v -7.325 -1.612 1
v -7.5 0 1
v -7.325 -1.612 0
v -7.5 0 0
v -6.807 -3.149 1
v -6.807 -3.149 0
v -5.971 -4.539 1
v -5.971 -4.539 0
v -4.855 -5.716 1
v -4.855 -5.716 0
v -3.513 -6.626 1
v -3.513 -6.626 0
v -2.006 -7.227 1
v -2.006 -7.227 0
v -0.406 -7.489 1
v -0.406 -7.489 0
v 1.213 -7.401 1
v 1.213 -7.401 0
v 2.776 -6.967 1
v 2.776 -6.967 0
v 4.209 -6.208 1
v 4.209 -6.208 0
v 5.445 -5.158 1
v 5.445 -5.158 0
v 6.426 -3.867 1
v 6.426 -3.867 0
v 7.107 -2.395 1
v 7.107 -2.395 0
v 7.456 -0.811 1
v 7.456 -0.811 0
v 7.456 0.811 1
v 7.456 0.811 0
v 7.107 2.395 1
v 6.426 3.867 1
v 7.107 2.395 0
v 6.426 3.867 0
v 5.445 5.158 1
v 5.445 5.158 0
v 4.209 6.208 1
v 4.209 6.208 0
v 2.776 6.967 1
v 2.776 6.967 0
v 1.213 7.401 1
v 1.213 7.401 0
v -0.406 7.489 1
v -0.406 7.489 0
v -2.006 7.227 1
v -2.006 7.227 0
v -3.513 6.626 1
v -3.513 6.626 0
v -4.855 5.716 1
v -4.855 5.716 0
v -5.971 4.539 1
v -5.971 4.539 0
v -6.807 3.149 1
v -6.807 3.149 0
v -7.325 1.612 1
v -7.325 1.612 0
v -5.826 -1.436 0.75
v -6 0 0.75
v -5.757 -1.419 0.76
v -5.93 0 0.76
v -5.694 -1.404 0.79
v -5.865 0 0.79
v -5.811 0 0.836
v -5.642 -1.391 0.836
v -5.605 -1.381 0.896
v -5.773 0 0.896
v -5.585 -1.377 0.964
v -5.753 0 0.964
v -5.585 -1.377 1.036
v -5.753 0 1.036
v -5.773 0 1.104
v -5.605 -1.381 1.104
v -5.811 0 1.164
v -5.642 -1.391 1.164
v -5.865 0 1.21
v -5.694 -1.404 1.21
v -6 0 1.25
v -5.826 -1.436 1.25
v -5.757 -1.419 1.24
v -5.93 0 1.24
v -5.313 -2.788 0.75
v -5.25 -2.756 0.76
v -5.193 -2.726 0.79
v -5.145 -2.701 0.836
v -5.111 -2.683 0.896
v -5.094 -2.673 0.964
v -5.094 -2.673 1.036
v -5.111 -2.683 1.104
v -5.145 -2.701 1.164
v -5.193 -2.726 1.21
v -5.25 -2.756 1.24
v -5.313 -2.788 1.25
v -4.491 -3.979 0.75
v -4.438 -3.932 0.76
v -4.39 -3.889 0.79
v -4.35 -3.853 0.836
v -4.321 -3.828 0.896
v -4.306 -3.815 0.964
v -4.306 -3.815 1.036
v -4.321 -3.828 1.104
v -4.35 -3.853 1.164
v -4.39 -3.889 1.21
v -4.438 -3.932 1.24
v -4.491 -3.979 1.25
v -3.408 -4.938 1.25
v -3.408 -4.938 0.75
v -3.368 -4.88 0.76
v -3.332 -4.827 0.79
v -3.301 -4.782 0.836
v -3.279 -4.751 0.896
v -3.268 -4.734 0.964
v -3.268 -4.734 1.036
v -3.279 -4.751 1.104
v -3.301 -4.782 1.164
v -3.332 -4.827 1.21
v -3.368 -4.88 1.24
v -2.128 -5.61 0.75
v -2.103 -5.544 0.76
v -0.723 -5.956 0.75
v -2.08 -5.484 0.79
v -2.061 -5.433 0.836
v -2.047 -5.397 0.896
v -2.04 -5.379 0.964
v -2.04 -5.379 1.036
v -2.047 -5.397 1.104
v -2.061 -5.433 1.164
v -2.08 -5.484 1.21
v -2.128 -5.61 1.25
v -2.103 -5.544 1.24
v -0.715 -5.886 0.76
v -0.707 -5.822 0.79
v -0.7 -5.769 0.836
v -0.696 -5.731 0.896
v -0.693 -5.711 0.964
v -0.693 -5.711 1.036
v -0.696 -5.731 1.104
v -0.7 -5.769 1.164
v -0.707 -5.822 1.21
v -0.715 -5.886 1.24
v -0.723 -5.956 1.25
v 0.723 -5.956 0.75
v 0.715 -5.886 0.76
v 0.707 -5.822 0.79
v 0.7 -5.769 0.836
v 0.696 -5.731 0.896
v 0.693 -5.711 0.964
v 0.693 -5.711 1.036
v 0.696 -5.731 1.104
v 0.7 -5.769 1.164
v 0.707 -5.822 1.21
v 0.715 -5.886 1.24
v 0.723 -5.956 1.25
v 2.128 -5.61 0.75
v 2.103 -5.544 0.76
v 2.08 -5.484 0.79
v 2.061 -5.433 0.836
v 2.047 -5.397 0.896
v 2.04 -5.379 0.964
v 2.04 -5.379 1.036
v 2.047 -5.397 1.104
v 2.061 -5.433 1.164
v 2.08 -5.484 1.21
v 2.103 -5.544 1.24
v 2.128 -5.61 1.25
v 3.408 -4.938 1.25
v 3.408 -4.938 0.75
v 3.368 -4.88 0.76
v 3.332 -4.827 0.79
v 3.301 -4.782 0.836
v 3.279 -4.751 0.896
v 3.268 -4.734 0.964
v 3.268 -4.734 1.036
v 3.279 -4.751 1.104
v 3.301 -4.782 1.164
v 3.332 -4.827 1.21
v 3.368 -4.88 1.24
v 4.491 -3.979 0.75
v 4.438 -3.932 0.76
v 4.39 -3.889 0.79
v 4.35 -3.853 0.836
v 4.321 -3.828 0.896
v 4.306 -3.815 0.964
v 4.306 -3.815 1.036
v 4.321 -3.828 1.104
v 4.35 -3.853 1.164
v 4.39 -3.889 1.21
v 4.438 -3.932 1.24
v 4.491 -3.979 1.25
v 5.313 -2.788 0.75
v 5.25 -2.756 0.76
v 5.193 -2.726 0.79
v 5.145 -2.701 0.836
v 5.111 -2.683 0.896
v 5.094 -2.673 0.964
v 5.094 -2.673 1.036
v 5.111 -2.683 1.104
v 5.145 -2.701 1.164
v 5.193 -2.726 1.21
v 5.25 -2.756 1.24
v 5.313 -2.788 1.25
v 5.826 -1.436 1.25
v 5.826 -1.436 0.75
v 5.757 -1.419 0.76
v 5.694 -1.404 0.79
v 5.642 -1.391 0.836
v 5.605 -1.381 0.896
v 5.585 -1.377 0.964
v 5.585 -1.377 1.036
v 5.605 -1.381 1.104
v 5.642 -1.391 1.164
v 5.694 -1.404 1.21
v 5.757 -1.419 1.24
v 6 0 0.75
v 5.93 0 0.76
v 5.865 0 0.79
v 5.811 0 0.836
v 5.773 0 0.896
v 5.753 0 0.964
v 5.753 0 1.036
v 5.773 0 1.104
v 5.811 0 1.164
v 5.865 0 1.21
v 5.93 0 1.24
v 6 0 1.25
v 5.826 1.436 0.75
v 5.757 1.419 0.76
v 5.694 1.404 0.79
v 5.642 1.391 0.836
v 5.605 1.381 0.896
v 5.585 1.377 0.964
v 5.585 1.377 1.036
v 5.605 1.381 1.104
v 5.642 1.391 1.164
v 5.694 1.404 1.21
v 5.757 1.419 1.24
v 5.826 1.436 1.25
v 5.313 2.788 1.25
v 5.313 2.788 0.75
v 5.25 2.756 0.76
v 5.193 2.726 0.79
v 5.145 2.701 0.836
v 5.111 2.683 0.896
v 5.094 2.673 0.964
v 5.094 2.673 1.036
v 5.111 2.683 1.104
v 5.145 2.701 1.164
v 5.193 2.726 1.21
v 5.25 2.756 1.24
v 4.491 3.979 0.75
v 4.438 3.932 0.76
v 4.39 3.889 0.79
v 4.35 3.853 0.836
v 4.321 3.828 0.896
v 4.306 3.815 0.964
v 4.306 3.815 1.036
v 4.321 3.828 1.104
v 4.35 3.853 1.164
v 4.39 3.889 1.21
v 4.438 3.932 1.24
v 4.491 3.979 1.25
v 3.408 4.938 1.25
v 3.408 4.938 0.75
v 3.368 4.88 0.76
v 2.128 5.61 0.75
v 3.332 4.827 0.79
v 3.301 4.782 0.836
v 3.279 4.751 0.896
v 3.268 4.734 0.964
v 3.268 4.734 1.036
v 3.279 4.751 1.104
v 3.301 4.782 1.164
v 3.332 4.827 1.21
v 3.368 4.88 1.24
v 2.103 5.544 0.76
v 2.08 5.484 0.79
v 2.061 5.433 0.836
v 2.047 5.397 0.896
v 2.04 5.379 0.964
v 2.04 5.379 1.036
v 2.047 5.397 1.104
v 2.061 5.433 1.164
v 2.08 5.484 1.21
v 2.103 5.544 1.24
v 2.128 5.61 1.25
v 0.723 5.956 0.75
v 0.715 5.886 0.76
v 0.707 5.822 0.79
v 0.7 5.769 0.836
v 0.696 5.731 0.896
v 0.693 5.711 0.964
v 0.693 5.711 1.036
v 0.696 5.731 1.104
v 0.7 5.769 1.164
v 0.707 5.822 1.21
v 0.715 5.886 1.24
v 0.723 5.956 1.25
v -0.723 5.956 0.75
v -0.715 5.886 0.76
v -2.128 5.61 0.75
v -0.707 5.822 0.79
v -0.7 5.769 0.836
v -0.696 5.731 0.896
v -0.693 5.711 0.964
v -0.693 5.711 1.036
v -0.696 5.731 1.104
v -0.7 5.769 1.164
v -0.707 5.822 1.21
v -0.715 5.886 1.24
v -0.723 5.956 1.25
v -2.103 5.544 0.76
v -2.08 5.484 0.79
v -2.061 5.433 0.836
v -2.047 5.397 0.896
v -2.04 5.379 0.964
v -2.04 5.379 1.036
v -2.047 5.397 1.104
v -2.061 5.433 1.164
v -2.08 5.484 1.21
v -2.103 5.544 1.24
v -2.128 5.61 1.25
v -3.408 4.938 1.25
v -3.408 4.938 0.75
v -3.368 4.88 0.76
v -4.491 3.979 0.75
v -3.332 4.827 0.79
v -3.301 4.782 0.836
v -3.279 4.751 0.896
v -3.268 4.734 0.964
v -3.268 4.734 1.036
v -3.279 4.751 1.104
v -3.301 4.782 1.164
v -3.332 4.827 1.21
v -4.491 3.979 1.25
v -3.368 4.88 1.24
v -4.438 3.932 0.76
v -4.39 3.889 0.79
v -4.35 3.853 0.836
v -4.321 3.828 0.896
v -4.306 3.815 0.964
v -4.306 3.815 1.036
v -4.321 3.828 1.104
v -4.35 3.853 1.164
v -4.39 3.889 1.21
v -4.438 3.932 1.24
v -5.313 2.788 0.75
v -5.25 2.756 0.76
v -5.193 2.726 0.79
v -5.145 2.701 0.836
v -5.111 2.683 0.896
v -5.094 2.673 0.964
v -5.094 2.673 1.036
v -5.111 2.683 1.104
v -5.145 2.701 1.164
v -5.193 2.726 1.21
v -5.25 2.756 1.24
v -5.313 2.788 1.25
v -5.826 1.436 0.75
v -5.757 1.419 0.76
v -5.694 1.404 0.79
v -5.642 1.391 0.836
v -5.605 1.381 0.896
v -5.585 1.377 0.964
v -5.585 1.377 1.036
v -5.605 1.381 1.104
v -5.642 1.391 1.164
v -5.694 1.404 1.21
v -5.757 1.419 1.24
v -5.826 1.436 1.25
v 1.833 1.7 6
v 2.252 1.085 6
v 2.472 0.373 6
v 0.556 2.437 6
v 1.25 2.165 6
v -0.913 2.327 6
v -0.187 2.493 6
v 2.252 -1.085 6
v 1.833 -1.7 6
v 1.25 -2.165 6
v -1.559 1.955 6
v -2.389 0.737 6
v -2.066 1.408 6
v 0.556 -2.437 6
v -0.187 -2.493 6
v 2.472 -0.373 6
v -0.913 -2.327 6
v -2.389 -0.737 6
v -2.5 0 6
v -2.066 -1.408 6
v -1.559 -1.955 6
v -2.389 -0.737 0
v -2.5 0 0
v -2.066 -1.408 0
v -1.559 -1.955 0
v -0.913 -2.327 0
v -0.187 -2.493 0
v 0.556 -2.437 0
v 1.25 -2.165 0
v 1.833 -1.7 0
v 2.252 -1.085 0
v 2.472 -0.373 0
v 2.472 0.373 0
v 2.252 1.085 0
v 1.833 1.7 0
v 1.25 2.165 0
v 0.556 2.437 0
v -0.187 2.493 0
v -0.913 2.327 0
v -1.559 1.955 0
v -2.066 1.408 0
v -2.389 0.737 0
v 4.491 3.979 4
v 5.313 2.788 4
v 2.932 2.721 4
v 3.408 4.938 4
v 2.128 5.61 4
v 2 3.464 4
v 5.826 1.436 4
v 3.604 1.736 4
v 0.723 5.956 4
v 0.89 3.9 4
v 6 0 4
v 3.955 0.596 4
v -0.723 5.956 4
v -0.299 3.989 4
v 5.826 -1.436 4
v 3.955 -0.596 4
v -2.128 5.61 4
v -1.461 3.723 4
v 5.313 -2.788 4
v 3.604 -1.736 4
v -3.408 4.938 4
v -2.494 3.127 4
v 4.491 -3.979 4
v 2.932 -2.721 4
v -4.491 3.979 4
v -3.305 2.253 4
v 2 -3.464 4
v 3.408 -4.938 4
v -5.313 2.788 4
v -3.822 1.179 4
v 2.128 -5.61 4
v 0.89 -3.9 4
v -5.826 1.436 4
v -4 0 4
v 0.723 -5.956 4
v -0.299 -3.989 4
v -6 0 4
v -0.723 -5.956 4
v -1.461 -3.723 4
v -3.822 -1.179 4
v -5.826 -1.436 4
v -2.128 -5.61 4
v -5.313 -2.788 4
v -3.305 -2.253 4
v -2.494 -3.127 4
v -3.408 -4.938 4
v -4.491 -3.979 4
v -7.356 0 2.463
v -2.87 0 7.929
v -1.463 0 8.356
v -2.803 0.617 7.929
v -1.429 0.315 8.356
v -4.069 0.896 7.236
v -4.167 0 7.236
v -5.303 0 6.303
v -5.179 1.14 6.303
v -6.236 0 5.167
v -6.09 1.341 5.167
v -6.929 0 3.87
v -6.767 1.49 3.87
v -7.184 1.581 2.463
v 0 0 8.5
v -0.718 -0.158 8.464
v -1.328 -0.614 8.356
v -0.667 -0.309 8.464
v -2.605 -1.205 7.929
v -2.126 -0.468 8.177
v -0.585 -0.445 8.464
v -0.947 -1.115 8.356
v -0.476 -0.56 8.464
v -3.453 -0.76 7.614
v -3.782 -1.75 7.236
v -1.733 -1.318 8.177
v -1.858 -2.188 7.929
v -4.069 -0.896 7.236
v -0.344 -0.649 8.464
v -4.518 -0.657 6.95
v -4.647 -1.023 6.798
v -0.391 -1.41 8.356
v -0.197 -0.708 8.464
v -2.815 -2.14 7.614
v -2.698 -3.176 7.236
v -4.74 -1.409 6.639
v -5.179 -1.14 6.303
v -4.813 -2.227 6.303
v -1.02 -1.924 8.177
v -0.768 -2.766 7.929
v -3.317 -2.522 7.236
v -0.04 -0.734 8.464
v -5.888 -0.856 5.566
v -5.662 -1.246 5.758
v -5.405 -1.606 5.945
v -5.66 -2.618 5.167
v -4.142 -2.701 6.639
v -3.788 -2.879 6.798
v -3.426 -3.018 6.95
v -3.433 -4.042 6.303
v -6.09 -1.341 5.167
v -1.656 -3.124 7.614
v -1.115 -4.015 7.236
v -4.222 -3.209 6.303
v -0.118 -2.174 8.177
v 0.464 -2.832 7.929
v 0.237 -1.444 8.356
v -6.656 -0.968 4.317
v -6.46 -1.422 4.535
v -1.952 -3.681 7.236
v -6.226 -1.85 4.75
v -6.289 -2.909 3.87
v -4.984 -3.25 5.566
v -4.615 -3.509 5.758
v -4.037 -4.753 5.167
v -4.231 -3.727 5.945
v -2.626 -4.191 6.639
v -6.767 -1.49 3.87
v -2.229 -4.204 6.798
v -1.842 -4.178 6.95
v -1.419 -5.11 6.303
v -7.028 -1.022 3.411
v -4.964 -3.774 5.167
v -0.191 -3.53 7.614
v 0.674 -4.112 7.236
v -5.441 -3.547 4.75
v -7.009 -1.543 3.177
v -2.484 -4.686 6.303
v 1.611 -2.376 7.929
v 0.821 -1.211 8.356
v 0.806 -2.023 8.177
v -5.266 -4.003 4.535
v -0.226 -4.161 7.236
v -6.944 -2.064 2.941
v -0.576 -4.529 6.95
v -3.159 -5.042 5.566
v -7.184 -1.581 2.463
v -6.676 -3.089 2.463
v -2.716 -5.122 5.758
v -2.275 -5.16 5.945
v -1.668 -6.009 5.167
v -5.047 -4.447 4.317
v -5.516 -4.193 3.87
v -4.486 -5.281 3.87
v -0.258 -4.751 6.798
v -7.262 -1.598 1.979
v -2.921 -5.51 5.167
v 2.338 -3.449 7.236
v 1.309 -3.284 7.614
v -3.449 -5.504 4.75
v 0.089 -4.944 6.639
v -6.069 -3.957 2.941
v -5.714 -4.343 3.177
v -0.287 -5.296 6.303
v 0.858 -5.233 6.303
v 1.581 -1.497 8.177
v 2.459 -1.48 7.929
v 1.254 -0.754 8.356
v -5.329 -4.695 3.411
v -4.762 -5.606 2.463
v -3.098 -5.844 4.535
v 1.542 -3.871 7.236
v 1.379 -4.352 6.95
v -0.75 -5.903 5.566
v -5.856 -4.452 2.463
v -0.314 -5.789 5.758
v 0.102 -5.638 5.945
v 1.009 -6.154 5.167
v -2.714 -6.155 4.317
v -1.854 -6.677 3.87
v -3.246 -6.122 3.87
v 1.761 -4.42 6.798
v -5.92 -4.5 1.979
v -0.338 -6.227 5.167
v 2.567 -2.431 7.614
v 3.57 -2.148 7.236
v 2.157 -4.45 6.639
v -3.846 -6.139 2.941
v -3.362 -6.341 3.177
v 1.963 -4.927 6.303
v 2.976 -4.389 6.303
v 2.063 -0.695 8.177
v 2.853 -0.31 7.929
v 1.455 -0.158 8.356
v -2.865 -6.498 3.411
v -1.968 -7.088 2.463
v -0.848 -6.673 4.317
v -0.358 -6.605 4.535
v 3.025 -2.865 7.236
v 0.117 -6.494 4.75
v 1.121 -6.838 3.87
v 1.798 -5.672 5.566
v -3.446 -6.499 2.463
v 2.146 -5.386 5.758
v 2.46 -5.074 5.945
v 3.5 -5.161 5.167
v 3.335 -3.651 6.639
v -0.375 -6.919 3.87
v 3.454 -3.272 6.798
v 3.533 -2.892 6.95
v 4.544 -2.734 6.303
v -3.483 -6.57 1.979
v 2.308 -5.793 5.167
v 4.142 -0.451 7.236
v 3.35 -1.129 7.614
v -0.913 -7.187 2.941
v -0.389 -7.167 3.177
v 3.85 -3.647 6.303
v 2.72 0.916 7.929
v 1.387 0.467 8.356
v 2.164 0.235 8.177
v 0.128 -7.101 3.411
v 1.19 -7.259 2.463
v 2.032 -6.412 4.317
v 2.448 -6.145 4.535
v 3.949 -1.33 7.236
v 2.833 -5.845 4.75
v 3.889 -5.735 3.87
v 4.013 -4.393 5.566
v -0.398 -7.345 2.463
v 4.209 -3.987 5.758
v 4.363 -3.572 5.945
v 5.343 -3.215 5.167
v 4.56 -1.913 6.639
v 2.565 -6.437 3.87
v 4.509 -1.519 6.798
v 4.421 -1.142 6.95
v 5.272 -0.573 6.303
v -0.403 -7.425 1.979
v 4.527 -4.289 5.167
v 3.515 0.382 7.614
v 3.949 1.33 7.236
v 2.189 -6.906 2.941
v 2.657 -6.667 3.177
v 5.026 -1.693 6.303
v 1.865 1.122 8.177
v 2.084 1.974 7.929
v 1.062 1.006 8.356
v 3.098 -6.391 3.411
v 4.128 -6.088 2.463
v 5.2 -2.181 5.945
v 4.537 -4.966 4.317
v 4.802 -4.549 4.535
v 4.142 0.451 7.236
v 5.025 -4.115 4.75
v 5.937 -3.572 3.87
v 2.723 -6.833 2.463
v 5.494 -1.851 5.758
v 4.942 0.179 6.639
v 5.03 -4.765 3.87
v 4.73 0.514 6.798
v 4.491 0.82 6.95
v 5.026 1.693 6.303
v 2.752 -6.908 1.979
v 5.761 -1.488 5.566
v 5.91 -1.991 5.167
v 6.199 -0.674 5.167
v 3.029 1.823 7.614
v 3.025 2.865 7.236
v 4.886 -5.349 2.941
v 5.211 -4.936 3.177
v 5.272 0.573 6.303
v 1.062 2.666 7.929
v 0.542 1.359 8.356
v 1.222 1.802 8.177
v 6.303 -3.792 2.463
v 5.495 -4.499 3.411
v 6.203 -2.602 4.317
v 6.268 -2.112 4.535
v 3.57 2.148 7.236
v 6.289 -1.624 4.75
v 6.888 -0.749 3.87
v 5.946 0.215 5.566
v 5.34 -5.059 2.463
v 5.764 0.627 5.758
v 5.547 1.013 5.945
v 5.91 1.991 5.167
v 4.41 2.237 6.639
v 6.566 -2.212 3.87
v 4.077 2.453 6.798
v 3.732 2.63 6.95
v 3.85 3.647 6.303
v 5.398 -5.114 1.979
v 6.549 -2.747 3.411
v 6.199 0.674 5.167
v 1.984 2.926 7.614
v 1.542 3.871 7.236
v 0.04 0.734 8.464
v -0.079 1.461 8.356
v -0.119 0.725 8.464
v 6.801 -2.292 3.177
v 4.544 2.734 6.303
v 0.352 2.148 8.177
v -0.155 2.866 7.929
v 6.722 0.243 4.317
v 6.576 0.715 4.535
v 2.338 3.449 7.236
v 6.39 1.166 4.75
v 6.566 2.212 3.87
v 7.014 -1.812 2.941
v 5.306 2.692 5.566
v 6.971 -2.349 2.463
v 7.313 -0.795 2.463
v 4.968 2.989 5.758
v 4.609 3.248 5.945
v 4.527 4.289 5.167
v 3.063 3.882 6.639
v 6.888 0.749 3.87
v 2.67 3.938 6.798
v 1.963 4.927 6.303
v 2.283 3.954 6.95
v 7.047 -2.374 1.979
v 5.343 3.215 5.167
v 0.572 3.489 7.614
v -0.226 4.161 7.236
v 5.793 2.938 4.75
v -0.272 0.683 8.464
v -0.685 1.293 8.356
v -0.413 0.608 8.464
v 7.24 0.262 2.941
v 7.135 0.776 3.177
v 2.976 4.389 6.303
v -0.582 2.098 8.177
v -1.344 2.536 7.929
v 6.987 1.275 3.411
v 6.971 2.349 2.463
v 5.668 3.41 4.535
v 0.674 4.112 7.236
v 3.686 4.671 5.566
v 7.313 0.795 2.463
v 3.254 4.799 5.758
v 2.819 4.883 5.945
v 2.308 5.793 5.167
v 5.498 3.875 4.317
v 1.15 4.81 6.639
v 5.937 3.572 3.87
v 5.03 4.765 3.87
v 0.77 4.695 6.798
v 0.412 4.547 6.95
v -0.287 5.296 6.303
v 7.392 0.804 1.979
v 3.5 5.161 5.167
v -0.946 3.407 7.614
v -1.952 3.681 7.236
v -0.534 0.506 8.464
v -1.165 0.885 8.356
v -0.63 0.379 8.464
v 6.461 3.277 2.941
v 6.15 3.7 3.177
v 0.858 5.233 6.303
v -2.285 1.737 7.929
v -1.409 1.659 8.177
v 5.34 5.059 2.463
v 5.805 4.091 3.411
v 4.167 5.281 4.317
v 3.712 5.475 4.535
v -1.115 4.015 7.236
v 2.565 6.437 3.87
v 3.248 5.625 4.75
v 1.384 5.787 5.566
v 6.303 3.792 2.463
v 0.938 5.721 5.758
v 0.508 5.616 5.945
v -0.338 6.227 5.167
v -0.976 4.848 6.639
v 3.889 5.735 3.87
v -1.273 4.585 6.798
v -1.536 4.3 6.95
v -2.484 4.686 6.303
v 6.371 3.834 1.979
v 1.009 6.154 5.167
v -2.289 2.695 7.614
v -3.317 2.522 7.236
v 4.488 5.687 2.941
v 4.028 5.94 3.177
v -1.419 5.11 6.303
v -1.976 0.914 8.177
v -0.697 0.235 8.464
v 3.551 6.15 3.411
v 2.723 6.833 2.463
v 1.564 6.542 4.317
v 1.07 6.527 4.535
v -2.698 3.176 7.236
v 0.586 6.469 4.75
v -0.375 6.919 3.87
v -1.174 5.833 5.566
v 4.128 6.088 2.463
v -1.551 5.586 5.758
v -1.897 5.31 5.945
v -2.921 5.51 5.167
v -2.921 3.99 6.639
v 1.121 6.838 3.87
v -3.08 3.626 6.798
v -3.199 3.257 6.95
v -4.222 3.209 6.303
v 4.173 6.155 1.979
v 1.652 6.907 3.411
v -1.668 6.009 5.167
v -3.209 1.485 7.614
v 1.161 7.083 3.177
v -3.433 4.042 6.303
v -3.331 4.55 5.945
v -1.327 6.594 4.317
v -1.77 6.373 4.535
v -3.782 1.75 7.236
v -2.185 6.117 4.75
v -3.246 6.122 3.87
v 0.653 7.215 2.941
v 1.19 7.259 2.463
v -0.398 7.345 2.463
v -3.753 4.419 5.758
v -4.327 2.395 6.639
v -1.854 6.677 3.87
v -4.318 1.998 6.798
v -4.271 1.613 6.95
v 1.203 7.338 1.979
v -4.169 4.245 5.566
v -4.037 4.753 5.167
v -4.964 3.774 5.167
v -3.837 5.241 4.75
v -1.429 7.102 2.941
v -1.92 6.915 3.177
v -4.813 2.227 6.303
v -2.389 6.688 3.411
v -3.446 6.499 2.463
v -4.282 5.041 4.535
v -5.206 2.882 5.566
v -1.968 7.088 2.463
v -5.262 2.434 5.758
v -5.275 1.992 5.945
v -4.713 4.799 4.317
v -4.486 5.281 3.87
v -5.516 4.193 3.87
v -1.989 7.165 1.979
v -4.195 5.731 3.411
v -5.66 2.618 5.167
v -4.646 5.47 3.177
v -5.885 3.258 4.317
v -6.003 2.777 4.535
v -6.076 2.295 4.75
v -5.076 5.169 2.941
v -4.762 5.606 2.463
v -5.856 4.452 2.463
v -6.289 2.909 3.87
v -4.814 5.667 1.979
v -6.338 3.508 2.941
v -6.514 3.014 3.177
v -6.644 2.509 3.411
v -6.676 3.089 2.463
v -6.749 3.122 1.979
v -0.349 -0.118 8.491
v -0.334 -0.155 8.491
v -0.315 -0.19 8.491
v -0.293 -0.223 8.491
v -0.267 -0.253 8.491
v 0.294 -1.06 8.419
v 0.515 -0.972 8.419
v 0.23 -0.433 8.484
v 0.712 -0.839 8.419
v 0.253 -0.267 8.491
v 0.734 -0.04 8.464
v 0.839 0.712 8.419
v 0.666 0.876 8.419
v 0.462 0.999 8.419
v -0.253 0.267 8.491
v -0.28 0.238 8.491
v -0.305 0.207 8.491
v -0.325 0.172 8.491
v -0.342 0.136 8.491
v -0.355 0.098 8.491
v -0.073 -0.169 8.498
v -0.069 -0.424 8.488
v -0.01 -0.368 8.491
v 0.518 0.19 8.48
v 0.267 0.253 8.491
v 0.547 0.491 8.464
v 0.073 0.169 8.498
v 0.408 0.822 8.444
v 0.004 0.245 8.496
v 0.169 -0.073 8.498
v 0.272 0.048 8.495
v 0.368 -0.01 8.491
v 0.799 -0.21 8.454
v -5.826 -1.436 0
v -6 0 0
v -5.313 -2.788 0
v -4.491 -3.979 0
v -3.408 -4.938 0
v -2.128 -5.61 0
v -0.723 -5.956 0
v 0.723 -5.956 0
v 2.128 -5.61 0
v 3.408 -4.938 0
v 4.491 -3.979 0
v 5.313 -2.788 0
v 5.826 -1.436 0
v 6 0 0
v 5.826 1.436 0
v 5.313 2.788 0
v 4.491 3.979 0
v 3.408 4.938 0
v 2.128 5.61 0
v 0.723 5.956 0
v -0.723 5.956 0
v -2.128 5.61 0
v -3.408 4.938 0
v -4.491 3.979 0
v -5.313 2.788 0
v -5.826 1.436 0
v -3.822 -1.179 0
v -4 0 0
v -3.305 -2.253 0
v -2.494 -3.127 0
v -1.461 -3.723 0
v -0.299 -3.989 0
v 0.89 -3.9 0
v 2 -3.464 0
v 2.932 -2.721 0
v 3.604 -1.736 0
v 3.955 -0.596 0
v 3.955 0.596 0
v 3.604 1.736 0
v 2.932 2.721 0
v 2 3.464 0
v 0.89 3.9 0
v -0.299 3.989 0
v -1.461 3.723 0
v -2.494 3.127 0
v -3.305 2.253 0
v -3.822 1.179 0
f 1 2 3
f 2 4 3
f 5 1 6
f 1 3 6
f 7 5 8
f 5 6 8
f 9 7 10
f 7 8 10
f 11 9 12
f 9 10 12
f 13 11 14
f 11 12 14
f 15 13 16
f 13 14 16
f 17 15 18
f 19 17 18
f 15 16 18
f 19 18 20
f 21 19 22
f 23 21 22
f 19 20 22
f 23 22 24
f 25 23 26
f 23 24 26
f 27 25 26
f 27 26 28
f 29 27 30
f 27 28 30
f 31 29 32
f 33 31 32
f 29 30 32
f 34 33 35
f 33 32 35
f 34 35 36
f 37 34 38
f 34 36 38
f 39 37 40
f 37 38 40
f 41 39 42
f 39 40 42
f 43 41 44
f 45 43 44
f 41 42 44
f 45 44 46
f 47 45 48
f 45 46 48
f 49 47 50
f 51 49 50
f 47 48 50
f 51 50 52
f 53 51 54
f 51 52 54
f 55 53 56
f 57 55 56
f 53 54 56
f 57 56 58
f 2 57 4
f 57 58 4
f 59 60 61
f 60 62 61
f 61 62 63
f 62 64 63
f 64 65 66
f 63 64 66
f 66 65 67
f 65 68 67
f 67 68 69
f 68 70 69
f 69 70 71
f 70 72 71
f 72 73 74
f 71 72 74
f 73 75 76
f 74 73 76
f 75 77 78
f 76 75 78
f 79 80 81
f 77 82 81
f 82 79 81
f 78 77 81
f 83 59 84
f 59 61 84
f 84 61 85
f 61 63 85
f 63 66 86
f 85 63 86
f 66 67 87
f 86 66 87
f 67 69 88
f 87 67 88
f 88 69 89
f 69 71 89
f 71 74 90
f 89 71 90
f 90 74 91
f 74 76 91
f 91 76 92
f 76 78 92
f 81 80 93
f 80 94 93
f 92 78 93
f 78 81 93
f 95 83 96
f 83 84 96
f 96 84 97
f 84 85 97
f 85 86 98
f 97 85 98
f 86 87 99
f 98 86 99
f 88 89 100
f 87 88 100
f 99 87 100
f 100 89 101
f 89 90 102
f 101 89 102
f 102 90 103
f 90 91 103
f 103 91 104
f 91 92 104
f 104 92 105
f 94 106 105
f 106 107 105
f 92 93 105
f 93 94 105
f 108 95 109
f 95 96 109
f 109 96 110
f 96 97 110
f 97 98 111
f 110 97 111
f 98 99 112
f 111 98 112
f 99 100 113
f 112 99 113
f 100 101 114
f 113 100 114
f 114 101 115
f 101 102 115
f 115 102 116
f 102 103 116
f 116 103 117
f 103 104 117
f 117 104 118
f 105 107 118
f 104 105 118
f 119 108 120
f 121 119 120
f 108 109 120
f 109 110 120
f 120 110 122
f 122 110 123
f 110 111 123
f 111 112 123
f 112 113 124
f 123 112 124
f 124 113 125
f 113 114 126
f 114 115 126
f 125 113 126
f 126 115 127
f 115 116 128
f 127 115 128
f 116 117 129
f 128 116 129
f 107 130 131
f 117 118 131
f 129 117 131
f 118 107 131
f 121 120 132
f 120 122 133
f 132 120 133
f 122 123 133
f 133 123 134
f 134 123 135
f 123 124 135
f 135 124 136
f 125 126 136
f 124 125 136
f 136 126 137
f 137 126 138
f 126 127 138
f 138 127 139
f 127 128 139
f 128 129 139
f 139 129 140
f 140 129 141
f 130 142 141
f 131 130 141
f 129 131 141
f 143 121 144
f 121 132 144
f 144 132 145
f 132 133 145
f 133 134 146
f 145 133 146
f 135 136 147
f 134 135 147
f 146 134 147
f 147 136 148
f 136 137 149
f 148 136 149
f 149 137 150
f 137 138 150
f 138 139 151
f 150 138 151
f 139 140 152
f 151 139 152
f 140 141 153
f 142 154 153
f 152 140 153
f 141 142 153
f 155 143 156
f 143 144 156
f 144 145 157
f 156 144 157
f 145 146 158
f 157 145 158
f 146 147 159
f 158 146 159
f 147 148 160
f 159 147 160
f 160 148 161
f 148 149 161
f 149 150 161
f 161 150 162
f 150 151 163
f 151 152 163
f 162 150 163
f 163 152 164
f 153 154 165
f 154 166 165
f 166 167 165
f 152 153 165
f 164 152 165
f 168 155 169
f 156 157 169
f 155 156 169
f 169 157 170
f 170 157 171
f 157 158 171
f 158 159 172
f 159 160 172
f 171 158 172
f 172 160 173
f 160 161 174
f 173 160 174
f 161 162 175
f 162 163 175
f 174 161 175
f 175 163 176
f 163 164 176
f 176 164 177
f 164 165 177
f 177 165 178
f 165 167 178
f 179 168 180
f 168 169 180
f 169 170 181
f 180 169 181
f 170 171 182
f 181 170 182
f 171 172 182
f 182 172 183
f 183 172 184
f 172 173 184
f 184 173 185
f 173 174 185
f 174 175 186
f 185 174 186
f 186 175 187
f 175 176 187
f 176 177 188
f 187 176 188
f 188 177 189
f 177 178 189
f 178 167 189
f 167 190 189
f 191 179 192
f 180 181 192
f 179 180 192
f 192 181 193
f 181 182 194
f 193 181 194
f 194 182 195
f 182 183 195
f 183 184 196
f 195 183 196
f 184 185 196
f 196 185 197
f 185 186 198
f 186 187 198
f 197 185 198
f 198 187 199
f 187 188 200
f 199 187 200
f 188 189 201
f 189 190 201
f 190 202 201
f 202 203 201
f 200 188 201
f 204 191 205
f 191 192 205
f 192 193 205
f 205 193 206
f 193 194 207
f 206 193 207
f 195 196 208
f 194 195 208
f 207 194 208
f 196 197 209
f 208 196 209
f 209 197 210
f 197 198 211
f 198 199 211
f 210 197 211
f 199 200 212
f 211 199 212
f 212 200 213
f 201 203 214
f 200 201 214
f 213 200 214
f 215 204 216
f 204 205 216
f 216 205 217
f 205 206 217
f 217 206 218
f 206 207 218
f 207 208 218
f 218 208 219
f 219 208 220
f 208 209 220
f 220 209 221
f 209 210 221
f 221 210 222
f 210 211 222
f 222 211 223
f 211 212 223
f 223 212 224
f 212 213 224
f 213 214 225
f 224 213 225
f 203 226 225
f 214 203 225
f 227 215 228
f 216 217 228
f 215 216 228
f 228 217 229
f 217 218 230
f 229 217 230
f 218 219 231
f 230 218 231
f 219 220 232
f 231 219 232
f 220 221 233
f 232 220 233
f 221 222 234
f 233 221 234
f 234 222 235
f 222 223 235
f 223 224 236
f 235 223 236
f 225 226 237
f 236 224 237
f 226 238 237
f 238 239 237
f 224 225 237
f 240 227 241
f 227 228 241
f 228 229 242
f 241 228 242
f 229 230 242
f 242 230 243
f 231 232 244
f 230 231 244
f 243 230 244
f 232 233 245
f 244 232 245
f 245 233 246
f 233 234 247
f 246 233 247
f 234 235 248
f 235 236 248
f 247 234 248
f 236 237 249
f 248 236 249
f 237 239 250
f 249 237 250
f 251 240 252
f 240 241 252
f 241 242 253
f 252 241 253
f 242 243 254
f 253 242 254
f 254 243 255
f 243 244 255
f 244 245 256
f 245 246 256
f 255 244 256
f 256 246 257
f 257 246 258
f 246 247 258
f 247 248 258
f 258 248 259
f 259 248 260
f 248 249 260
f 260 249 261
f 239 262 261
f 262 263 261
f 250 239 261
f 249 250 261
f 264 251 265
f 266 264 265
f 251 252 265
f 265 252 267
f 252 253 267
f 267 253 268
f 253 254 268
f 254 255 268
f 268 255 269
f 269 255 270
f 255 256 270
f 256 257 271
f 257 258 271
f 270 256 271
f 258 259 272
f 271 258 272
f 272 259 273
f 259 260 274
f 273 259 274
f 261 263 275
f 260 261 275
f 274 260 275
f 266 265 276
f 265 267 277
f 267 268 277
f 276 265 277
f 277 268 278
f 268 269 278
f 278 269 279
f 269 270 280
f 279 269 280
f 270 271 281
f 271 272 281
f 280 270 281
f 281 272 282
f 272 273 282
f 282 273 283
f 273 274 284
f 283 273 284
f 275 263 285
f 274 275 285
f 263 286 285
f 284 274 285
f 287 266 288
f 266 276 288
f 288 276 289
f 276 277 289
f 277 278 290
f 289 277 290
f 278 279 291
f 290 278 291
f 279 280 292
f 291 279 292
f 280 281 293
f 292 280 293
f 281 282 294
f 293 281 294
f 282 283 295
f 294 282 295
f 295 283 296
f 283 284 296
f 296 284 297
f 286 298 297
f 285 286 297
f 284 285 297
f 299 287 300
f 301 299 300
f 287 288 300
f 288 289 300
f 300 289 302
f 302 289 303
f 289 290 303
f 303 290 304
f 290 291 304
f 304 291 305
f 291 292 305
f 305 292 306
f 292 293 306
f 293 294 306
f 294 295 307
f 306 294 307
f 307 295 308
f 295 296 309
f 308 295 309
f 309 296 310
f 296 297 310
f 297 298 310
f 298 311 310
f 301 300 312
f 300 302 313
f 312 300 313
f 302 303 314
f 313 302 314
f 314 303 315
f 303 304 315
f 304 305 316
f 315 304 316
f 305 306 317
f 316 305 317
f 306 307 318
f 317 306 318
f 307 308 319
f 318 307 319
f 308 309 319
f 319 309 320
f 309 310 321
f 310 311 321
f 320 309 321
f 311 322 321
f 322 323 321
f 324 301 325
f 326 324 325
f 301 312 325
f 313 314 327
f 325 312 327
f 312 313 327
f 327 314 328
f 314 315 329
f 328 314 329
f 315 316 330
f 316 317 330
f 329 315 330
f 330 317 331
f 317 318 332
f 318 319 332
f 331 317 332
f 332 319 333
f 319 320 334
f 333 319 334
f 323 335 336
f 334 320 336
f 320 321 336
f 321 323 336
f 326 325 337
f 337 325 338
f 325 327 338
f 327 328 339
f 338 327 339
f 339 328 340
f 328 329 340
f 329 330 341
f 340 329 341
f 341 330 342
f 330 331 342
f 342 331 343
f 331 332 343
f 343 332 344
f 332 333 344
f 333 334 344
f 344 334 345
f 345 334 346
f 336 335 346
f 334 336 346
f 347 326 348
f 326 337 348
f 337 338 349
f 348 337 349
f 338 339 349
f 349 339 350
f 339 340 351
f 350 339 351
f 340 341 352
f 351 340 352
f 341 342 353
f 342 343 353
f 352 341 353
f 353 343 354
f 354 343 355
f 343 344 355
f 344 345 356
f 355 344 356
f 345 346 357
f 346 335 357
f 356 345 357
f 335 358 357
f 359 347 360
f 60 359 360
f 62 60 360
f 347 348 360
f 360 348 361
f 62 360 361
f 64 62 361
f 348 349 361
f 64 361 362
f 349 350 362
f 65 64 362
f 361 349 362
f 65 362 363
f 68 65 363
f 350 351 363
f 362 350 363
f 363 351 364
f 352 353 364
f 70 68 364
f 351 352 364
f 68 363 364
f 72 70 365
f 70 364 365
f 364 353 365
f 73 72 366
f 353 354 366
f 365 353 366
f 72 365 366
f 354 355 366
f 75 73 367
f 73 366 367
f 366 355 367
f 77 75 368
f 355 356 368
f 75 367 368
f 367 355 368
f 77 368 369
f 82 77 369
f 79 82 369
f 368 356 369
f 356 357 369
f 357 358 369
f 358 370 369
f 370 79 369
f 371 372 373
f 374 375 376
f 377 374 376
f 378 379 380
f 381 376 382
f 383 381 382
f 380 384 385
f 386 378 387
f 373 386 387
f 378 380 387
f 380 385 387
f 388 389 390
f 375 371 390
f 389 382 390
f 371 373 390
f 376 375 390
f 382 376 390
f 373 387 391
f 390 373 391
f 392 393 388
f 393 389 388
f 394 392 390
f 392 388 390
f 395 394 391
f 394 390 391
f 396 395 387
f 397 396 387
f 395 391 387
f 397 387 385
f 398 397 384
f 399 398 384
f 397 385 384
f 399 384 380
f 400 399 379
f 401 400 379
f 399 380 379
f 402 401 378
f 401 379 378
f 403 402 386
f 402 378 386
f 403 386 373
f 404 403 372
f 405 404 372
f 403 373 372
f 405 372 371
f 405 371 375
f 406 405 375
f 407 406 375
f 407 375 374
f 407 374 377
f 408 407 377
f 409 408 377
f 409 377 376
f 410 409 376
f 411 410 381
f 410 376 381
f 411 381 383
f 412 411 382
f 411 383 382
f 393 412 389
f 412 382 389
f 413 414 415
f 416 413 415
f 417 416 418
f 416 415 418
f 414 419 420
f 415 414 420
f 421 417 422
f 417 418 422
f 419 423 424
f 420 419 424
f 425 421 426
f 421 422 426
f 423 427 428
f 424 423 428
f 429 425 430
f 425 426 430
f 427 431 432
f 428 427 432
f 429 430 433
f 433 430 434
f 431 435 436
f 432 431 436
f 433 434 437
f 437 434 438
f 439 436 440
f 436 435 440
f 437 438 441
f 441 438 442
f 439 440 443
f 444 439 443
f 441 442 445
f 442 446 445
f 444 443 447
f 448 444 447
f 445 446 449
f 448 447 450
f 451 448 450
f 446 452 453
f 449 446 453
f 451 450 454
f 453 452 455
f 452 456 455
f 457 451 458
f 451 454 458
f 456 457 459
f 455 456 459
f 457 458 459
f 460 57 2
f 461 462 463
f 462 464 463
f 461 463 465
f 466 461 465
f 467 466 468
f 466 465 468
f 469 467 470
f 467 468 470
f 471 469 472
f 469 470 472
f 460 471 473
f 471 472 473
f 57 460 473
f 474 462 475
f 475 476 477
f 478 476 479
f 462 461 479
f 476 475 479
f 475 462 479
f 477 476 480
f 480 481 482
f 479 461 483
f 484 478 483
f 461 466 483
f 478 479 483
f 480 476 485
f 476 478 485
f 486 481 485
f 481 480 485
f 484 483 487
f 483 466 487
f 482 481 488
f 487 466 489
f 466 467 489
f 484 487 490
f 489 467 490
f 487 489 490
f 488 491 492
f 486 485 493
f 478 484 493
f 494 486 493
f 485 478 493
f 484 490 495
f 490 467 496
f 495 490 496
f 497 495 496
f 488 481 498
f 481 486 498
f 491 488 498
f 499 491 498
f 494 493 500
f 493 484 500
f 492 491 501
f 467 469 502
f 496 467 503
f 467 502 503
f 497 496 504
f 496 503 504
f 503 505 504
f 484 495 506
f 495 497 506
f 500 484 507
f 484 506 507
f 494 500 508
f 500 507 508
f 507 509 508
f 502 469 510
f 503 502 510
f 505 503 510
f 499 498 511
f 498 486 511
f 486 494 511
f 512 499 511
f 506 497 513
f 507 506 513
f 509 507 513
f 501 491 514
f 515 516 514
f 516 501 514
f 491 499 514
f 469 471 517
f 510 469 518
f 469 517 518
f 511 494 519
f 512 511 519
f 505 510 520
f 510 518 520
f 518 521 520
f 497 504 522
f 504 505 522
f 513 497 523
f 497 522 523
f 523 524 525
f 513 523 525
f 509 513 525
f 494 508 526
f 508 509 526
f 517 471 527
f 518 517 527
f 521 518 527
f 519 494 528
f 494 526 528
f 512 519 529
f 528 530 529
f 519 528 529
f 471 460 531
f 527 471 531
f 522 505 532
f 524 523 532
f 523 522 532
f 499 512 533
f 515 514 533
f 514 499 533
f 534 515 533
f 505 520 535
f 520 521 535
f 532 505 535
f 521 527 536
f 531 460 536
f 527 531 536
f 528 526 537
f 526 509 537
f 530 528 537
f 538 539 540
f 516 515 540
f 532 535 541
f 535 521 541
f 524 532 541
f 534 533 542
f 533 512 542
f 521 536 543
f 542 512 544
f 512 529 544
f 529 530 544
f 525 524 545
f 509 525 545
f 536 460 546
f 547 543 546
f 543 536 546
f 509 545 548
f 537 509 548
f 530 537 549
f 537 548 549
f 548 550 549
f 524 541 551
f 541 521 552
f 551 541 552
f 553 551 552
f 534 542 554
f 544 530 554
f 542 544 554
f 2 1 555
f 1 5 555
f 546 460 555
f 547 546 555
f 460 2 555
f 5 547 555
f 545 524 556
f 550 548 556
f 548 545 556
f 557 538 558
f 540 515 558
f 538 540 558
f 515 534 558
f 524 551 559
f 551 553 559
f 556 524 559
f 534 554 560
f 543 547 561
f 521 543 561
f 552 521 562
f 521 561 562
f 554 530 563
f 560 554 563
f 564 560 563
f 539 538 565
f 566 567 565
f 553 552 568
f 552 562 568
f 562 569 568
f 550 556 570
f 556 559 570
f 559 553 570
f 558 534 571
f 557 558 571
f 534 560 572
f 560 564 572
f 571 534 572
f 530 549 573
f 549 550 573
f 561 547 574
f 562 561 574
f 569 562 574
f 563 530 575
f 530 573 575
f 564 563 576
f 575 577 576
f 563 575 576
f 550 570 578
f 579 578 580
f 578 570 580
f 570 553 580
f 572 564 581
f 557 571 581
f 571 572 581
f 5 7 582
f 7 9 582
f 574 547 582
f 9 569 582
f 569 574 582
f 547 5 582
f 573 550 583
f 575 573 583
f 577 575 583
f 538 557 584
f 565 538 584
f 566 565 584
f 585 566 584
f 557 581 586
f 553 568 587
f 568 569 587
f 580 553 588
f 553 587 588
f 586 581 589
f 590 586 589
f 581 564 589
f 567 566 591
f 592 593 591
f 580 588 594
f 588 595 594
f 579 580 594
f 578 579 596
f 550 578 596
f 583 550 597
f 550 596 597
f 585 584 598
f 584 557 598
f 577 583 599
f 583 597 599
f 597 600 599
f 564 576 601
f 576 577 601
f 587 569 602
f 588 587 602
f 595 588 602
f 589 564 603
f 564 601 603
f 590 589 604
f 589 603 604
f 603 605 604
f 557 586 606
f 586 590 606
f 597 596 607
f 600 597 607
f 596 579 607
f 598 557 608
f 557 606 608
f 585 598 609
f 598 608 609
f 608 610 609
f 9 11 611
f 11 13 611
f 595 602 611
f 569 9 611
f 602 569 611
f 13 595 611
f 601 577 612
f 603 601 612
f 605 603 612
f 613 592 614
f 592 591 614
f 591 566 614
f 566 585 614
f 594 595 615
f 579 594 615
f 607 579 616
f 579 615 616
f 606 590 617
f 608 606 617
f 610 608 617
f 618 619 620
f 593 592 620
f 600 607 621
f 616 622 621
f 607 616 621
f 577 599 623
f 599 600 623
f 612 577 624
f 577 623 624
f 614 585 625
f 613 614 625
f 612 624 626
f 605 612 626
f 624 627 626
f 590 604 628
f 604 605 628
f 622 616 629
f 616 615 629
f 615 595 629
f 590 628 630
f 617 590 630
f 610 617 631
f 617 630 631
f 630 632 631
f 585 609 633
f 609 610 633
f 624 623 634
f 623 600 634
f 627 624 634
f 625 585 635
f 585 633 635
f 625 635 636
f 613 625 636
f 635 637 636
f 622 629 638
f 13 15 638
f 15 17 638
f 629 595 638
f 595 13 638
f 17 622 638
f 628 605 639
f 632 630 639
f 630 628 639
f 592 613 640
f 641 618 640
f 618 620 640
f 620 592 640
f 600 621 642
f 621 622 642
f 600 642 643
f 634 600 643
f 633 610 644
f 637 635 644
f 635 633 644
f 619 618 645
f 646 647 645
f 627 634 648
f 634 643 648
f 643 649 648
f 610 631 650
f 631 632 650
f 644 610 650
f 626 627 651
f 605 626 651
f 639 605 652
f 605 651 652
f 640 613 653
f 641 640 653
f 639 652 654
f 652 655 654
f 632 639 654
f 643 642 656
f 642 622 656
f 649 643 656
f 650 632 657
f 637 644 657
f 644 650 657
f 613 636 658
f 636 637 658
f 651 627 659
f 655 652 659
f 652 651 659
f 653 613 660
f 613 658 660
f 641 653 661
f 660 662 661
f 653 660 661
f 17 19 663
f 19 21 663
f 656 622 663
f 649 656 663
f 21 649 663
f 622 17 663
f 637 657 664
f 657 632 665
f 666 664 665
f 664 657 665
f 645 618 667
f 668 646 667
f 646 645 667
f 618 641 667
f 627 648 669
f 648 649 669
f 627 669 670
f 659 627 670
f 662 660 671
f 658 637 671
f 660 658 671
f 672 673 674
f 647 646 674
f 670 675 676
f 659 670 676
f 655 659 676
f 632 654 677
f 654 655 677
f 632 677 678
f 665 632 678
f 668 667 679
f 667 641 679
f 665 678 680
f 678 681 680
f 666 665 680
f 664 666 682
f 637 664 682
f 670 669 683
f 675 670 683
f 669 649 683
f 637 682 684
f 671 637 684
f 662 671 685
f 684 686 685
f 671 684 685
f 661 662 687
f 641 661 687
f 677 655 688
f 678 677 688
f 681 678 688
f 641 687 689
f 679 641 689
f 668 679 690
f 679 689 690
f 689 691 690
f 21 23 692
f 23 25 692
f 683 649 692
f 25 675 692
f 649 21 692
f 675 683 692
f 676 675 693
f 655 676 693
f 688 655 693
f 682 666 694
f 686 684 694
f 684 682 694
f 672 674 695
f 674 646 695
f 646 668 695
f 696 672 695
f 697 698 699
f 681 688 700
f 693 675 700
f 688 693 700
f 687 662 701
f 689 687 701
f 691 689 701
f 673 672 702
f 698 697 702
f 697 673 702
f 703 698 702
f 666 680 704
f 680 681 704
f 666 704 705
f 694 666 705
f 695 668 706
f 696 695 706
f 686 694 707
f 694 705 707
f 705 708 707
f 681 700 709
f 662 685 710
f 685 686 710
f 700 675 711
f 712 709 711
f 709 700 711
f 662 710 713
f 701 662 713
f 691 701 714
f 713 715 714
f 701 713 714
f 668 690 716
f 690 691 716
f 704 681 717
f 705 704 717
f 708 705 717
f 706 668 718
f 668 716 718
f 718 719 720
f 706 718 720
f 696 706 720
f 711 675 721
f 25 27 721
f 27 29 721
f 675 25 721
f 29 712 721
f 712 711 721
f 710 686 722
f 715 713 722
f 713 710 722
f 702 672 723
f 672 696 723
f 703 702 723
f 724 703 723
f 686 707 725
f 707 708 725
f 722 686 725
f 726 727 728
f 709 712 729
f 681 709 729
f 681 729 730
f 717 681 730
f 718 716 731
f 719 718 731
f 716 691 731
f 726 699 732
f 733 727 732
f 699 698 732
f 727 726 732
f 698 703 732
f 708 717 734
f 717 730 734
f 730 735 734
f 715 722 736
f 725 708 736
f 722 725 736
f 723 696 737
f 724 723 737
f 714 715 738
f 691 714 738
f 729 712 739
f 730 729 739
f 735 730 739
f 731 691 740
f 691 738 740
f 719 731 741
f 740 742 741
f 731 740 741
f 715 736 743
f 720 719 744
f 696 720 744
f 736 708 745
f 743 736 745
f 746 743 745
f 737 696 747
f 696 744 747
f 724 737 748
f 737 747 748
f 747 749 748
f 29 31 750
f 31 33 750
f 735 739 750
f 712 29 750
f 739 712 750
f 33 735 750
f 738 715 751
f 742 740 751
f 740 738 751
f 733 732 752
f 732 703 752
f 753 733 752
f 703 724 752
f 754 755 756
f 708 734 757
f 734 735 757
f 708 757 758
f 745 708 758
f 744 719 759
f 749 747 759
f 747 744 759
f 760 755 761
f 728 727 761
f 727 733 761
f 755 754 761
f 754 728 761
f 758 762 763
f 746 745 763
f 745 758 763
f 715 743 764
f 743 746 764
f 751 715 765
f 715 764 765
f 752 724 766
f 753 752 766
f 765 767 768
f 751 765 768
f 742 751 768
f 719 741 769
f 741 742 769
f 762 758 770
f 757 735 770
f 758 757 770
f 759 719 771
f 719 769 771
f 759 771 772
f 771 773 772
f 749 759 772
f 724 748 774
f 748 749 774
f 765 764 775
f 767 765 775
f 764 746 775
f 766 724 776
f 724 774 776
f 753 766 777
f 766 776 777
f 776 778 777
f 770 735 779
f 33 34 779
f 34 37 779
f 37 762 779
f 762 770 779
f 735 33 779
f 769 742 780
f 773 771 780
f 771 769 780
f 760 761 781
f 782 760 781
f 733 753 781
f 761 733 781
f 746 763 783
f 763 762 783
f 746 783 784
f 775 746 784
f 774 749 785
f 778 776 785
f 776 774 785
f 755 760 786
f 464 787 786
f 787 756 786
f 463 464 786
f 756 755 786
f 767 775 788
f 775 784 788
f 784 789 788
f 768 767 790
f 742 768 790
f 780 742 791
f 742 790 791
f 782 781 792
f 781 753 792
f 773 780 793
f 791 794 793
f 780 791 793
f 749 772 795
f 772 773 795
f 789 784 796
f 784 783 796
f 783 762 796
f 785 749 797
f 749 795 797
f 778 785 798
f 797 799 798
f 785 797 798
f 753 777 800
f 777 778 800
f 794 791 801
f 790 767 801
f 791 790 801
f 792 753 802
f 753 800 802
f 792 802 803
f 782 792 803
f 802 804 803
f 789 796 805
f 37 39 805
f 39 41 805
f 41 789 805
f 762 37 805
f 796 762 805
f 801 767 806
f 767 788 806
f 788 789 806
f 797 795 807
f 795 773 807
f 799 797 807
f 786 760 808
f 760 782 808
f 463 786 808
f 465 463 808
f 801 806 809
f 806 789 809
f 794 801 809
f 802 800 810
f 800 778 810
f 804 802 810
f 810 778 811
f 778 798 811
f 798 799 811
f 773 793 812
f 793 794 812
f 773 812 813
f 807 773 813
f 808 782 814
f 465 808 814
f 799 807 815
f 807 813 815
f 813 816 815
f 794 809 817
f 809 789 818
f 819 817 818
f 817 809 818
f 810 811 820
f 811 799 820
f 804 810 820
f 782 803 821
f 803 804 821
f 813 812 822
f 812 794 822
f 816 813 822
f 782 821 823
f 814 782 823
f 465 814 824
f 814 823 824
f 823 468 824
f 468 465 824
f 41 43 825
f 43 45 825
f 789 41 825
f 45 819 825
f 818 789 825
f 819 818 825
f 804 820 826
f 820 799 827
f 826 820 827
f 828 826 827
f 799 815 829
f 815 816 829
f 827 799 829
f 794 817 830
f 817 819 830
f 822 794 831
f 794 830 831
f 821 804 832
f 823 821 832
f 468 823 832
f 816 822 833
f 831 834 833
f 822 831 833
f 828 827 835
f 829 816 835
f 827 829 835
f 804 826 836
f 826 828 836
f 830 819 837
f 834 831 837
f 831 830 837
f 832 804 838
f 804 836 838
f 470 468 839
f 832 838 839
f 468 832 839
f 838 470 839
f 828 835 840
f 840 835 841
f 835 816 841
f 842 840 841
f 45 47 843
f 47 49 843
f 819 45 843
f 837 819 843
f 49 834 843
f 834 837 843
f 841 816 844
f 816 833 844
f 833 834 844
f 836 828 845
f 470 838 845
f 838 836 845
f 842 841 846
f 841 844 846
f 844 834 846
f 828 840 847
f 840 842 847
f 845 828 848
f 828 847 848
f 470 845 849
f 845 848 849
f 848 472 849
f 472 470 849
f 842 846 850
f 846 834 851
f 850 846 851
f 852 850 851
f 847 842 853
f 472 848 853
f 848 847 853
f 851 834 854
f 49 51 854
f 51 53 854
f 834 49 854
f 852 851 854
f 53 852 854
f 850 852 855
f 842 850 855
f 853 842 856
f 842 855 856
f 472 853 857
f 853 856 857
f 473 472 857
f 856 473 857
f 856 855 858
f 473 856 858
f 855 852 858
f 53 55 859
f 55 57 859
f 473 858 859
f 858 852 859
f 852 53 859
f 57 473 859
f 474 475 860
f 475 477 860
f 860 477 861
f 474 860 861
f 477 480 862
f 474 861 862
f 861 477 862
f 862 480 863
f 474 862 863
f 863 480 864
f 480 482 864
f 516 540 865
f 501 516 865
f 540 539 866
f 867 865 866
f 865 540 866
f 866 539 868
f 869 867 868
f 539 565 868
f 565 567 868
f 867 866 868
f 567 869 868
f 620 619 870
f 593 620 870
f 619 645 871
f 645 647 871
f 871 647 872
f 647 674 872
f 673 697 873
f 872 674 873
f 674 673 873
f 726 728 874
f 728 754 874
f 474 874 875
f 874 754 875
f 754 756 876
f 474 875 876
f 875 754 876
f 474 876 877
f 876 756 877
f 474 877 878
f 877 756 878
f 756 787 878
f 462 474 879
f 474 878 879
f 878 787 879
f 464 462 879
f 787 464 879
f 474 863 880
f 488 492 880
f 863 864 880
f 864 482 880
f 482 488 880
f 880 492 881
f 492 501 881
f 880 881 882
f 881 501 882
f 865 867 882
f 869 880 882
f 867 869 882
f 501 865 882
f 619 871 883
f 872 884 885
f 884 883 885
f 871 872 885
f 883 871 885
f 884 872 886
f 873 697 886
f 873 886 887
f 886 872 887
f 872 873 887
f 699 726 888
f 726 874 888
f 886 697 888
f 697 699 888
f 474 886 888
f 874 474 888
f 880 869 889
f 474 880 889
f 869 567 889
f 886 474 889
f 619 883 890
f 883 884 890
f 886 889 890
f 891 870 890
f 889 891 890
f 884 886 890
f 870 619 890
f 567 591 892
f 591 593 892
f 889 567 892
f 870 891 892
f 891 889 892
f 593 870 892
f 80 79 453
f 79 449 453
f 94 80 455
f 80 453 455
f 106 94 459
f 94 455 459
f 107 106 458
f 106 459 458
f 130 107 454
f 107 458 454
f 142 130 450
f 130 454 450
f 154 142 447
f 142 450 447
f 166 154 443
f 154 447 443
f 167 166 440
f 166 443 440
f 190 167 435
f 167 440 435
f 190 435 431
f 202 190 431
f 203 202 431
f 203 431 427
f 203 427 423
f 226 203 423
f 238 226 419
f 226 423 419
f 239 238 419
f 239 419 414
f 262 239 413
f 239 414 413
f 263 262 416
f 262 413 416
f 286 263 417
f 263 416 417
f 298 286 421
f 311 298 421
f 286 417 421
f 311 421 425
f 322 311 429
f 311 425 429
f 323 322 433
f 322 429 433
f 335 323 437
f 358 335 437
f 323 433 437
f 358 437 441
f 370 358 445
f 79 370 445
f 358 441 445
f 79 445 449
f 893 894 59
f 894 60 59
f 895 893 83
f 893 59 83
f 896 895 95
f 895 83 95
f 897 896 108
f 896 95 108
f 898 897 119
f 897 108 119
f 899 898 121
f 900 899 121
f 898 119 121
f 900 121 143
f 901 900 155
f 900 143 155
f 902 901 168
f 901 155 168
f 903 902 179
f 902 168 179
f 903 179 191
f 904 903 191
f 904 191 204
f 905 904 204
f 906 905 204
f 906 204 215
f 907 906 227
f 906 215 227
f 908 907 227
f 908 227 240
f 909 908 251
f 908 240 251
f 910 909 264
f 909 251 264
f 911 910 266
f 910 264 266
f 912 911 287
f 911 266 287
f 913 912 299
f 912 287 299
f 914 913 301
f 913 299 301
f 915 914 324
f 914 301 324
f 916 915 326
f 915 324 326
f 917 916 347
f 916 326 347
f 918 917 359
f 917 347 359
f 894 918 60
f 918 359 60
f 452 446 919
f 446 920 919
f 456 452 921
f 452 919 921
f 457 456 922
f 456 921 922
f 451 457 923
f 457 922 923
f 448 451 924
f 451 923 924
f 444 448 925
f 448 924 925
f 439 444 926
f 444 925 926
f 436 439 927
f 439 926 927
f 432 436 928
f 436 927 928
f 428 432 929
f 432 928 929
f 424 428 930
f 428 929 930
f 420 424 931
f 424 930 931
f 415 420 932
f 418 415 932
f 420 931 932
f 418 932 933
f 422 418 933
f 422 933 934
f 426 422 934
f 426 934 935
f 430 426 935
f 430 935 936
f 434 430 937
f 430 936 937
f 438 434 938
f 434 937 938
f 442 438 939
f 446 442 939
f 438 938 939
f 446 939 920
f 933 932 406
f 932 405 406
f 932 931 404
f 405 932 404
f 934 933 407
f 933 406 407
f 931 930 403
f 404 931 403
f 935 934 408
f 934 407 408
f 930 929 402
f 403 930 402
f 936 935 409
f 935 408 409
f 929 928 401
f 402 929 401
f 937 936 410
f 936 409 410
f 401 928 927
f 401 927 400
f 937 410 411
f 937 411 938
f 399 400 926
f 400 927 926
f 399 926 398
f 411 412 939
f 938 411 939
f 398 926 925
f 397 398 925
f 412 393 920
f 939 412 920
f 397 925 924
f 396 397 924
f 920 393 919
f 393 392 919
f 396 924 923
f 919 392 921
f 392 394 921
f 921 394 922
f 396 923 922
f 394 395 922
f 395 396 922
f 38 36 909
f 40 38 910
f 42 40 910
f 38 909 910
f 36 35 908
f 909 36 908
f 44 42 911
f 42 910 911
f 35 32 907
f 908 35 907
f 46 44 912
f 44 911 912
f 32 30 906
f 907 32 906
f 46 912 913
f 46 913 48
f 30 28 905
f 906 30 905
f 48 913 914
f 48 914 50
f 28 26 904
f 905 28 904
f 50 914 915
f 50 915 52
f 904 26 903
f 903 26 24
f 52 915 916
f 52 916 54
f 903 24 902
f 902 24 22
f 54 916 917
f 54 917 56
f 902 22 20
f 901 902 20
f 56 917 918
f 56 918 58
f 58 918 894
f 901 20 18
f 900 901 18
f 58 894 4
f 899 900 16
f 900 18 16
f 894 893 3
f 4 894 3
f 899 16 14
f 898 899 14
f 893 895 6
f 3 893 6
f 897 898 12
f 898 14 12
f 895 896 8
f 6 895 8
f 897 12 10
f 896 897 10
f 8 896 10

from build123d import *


with BuildPart() as f1:
    # F0 (on Front) → F1 (revolve)
    with BuildSketch(Plane.XZ):
        with BuildLine():
            Line((-2.5, 6), (0, 6))
            Line((0, 6), (0, 8.5))
            ThreePointArc((0, 8.5), (-5.303301, 6.303301), (-7.5, 1))
            Line((-7.5, 1), (-7.5, 0))
            Line((-7.5, 0), (-6, 0))
            Line((-6, 0), (-6, 0.75))
            ThreePointArc((-6, 0.75), (-5.75, 1), (-6, 1.25))
            Line((-6, 1.25), (-6, 4))
            Line((-6, 4), (-4, 4))
            Line((-4, 4), (-4, 0))
            Line((-4, 0), (-2.5, 0))
            Line((-2.5, 0), (-2.5, 6))
        make_face()
    revolve(axis=Axis((0, 0, 7.25), (0, 0, 1)))


solid = f1.part
